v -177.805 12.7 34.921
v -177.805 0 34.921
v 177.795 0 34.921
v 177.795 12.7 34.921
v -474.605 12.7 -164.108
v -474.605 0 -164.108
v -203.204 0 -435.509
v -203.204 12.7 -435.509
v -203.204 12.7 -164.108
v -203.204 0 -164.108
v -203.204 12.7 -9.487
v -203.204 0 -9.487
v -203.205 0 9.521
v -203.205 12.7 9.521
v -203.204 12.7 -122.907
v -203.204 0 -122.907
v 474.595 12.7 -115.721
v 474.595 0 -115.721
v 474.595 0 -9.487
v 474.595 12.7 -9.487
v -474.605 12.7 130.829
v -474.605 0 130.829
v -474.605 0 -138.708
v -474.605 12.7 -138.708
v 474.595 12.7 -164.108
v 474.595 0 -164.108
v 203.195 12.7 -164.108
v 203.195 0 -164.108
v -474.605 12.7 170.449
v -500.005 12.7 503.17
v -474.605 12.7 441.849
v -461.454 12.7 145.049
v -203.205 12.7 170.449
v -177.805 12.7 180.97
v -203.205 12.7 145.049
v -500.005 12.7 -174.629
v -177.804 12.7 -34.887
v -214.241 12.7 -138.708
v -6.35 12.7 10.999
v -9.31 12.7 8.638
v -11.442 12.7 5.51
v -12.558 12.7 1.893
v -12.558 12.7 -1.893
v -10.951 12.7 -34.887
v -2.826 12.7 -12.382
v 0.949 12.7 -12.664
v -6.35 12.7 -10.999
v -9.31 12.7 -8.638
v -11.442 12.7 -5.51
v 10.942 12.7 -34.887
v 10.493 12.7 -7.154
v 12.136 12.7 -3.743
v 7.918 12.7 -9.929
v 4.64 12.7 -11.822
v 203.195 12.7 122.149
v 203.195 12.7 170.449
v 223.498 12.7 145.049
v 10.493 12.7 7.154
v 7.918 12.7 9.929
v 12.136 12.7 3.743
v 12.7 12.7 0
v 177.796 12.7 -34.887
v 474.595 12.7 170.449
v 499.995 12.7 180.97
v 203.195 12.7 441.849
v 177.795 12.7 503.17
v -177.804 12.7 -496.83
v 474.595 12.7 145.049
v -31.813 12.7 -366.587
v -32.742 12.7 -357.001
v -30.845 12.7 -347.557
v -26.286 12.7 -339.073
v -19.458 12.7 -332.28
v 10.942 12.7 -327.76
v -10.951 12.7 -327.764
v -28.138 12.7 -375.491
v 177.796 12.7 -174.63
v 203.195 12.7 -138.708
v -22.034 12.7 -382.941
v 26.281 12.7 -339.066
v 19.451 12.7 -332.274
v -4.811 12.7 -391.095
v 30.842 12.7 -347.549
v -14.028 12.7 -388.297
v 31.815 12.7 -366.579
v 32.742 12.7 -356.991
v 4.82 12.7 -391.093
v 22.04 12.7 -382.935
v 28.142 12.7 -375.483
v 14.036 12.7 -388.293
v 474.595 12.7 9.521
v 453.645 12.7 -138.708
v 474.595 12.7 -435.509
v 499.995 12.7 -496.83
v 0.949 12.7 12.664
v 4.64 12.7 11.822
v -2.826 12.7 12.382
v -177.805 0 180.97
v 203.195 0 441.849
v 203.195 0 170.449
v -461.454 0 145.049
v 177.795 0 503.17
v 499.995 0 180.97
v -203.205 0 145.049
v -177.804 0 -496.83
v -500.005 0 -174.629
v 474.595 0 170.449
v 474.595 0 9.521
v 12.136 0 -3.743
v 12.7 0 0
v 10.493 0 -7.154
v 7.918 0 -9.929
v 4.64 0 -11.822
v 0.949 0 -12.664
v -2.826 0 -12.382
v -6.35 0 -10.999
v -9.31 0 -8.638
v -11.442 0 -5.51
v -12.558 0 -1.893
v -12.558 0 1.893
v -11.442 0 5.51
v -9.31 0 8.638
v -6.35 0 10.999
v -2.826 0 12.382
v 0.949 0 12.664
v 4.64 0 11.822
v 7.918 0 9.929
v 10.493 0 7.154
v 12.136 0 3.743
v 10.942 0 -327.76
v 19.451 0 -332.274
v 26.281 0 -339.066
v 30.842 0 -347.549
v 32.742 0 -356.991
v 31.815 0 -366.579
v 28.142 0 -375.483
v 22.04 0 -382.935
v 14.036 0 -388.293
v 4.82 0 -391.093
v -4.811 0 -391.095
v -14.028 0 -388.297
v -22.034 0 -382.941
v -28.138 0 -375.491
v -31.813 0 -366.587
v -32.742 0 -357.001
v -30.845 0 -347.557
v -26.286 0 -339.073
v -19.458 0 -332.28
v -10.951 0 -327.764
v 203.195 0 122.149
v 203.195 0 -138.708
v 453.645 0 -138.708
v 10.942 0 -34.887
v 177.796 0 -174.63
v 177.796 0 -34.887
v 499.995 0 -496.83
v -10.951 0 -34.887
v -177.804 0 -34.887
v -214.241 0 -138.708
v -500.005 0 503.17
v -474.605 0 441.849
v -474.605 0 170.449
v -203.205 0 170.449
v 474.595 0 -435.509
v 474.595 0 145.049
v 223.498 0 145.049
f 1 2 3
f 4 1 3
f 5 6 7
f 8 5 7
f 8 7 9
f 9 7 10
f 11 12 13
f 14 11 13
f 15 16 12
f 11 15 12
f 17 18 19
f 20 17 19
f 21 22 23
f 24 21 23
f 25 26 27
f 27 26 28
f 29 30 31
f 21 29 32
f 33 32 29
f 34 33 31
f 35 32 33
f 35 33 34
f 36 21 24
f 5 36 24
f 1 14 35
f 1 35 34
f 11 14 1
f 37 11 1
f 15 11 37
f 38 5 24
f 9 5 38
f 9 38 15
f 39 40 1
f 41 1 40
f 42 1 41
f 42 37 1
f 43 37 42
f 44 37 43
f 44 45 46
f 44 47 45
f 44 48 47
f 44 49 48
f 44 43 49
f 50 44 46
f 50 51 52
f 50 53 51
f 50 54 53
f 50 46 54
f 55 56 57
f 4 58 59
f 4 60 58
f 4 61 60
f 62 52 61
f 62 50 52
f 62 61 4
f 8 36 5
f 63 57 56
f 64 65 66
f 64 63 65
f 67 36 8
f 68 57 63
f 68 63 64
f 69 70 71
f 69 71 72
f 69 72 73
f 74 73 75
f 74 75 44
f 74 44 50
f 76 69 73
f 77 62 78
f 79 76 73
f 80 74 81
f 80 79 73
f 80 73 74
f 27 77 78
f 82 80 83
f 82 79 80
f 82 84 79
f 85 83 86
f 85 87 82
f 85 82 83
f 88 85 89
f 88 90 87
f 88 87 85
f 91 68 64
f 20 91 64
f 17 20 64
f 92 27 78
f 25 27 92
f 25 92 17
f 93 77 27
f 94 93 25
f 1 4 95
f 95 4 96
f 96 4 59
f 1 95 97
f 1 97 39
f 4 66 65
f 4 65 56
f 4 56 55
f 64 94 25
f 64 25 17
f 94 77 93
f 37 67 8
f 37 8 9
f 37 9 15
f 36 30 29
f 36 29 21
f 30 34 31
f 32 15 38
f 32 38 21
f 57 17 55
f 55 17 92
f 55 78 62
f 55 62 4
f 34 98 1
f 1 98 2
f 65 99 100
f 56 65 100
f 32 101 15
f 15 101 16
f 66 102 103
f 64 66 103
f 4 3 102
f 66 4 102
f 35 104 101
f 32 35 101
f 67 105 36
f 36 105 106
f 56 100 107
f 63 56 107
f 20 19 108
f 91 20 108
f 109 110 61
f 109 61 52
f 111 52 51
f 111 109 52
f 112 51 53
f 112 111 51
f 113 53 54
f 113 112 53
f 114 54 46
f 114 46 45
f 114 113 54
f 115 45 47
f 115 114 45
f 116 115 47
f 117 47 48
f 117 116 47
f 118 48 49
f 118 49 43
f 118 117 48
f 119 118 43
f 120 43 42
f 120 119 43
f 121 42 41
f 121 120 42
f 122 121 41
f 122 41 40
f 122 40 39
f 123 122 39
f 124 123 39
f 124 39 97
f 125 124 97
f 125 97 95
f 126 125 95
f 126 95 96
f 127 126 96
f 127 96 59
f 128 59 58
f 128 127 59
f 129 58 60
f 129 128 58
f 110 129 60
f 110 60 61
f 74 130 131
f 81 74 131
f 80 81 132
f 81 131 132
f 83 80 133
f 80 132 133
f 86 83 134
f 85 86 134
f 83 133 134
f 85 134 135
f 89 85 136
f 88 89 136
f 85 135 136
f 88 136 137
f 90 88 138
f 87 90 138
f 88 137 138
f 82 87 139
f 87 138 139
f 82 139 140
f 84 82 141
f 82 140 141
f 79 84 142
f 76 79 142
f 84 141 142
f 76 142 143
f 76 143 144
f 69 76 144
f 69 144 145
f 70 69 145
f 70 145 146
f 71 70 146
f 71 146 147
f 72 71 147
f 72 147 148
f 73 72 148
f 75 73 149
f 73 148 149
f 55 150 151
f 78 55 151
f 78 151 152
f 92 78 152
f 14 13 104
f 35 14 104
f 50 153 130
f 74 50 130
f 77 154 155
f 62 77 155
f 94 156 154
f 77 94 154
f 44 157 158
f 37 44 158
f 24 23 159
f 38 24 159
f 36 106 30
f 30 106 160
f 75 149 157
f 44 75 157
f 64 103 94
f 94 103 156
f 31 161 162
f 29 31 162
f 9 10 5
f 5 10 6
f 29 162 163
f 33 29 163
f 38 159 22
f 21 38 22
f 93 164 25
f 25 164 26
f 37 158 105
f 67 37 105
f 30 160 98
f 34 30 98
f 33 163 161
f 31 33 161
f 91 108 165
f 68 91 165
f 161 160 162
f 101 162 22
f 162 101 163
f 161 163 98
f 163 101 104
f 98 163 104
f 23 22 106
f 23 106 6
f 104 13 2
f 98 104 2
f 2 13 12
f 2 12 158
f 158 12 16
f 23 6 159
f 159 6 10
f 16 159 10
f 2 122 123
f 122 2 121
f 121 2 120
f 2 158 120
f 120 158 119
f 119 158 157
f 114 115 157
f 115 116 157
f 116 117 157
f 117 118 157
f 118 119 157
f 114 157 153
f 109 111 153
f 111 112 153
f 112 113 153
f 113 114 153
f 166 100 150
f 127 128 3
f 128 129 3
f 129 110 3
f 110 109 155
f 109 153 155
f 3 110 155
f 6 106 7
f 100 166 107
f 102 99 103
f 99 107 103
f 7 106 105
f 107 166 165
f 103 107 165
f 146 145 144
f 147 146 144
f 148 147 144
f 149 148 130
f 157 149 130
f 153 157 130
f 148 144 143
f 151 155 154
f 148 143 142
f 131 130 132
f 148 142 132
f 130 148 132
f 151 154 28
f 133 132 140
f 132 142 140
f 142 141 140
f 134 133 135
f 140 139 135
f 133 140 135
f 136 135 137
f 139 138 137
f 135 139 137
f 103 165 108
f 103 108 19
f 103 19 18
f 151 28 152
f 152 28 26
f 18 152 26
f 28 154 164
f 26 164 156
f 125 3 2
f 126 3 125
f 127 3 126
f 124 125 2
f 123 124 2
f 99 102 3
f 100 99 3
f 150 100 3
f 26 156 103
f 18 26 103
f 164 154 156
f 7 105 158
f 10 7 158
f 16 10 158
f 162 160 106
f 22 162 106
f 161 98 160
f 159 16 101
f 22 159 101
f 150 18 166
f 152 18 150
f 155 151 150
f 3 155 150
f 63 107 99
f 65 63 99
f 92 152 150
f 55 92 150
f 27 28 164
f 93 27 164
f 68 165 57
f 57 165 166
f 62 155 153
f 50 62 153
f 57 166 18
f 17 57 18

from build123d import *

# Parameters (mm, degrees)
SKETCH1_R           = 12.7
BOSS_EXTRUDE1_DEPTH = 12.7


with BuildPart() as part:
    # Sketch1 → Boss-Extrude1 (new body)
    with BuildSketch(Plane(origin=(0, 0, 0), x_dir=(1, 0, 0), z_dir=(0, 1, 0))):
        with BuildLine():
            Line((-177.80483956, -180.970122773), (-177.80483956, -34.920560393))
            Line((-177.80483956, -34.920560393), (177.79516044, -34.920560393))
            Line((177.79516044, -34.920560393), (177.79516044, -503.170122773))
            Line((177.79516044, -503.170122773), (499.99516044, -180.970122773))
            Line((499.99516044, -180.970122773), (499.99516044, 496.829877227))
            Line((499.99516044, 496.829877227), (177.795656663, 174.63037345))
            Line((177.795656663, 174.63037345), (177.795656663, 34.887353965))
            Line((177.795656663, 34.887353965), (10.941991643, 34.887353965))
            Line((10.941991643, 34.887353965), (10.941991643, 327.760499625))
            ThreePointArc((10.941991643, 327.760499625), (0.004607764, 391.44950084), (-10.950678316, 327.76357658))
            Line((-10.950678316, 327.76357658), (-10.950678316, 34.887353965))
            Line((-10.950678316, 34.887353965), (-177.804343337, 34.887353965))
            Line((-177.804343337, 34.887353965), (-177.804343337, 496.829877227))
            Line((-177.804343337, 496.829877227), (-500.00483956, 174.629381004))
            Line((-500.00483956, 174.629381004), (-500.00483956, -503.170122773))
            Line((-500.00483956, -503.170122773), (-177.80483956, -180.970122773))
        make_face()
        Polygon((-461.454447779, -145.049098288), (-203.204343337, 122.90730747), (-203.204343337, 9.487353965), (-203.20483956, -9.520560393), (-203.20483956, -145.049098288), align=None, mode=Mode.SUBTRACT)
        Polygon((-203.204343337, 164.10835652), (-474.60483956, 164.10835652), (-203.204343337, 435.508852743), align=None, mode=Mode.SUBTRACT)
        Polygon((-474.60483956, 138.70835652), (-214.240958944, 138.70835652), (-474.60483956, -130.828873379), align=None, mode=Mode.SUBTRACT)
        Polygon((-474.60483956, -170.449098288), (-203.20483956, -170.449098288), (-474.60483956, -441.849098288), align=None, mode=Mode.SUBTRACT)
        Polygon((474.59516044, 9.487353965), (474.594664217, -9.520560393), (474.594664217, -145.049098288), (223.497797401, -145.049098288), (474.59516044, 115.721361844), align=None, mode=Mode.SUBTRACT)
        Polygon((474.594664217, -170.449098288), (203.194664217, -441.849098288), (203.194664217, -170.449098288), align=None, mode=Mode.SUBTRACT)
        Polygon((203.194664217, -122.149307614), (203.194664217, 138.70835652), (453.645393175, 138.70835652), align=None, mode=Mode.SUBTRACT)
        Polygon((203.194664217, 164.10835652), (474.59516044, 435.508852743), (474.59516044, 164.10835652), align=None, mode=Mode.SUBTRACT)
        Circle(SKETCH1_R, mode=Mode.SUBTRACT)
    extrude(amount=BOSS_EXTRUDE1_DEPTH)


solid = part.part
